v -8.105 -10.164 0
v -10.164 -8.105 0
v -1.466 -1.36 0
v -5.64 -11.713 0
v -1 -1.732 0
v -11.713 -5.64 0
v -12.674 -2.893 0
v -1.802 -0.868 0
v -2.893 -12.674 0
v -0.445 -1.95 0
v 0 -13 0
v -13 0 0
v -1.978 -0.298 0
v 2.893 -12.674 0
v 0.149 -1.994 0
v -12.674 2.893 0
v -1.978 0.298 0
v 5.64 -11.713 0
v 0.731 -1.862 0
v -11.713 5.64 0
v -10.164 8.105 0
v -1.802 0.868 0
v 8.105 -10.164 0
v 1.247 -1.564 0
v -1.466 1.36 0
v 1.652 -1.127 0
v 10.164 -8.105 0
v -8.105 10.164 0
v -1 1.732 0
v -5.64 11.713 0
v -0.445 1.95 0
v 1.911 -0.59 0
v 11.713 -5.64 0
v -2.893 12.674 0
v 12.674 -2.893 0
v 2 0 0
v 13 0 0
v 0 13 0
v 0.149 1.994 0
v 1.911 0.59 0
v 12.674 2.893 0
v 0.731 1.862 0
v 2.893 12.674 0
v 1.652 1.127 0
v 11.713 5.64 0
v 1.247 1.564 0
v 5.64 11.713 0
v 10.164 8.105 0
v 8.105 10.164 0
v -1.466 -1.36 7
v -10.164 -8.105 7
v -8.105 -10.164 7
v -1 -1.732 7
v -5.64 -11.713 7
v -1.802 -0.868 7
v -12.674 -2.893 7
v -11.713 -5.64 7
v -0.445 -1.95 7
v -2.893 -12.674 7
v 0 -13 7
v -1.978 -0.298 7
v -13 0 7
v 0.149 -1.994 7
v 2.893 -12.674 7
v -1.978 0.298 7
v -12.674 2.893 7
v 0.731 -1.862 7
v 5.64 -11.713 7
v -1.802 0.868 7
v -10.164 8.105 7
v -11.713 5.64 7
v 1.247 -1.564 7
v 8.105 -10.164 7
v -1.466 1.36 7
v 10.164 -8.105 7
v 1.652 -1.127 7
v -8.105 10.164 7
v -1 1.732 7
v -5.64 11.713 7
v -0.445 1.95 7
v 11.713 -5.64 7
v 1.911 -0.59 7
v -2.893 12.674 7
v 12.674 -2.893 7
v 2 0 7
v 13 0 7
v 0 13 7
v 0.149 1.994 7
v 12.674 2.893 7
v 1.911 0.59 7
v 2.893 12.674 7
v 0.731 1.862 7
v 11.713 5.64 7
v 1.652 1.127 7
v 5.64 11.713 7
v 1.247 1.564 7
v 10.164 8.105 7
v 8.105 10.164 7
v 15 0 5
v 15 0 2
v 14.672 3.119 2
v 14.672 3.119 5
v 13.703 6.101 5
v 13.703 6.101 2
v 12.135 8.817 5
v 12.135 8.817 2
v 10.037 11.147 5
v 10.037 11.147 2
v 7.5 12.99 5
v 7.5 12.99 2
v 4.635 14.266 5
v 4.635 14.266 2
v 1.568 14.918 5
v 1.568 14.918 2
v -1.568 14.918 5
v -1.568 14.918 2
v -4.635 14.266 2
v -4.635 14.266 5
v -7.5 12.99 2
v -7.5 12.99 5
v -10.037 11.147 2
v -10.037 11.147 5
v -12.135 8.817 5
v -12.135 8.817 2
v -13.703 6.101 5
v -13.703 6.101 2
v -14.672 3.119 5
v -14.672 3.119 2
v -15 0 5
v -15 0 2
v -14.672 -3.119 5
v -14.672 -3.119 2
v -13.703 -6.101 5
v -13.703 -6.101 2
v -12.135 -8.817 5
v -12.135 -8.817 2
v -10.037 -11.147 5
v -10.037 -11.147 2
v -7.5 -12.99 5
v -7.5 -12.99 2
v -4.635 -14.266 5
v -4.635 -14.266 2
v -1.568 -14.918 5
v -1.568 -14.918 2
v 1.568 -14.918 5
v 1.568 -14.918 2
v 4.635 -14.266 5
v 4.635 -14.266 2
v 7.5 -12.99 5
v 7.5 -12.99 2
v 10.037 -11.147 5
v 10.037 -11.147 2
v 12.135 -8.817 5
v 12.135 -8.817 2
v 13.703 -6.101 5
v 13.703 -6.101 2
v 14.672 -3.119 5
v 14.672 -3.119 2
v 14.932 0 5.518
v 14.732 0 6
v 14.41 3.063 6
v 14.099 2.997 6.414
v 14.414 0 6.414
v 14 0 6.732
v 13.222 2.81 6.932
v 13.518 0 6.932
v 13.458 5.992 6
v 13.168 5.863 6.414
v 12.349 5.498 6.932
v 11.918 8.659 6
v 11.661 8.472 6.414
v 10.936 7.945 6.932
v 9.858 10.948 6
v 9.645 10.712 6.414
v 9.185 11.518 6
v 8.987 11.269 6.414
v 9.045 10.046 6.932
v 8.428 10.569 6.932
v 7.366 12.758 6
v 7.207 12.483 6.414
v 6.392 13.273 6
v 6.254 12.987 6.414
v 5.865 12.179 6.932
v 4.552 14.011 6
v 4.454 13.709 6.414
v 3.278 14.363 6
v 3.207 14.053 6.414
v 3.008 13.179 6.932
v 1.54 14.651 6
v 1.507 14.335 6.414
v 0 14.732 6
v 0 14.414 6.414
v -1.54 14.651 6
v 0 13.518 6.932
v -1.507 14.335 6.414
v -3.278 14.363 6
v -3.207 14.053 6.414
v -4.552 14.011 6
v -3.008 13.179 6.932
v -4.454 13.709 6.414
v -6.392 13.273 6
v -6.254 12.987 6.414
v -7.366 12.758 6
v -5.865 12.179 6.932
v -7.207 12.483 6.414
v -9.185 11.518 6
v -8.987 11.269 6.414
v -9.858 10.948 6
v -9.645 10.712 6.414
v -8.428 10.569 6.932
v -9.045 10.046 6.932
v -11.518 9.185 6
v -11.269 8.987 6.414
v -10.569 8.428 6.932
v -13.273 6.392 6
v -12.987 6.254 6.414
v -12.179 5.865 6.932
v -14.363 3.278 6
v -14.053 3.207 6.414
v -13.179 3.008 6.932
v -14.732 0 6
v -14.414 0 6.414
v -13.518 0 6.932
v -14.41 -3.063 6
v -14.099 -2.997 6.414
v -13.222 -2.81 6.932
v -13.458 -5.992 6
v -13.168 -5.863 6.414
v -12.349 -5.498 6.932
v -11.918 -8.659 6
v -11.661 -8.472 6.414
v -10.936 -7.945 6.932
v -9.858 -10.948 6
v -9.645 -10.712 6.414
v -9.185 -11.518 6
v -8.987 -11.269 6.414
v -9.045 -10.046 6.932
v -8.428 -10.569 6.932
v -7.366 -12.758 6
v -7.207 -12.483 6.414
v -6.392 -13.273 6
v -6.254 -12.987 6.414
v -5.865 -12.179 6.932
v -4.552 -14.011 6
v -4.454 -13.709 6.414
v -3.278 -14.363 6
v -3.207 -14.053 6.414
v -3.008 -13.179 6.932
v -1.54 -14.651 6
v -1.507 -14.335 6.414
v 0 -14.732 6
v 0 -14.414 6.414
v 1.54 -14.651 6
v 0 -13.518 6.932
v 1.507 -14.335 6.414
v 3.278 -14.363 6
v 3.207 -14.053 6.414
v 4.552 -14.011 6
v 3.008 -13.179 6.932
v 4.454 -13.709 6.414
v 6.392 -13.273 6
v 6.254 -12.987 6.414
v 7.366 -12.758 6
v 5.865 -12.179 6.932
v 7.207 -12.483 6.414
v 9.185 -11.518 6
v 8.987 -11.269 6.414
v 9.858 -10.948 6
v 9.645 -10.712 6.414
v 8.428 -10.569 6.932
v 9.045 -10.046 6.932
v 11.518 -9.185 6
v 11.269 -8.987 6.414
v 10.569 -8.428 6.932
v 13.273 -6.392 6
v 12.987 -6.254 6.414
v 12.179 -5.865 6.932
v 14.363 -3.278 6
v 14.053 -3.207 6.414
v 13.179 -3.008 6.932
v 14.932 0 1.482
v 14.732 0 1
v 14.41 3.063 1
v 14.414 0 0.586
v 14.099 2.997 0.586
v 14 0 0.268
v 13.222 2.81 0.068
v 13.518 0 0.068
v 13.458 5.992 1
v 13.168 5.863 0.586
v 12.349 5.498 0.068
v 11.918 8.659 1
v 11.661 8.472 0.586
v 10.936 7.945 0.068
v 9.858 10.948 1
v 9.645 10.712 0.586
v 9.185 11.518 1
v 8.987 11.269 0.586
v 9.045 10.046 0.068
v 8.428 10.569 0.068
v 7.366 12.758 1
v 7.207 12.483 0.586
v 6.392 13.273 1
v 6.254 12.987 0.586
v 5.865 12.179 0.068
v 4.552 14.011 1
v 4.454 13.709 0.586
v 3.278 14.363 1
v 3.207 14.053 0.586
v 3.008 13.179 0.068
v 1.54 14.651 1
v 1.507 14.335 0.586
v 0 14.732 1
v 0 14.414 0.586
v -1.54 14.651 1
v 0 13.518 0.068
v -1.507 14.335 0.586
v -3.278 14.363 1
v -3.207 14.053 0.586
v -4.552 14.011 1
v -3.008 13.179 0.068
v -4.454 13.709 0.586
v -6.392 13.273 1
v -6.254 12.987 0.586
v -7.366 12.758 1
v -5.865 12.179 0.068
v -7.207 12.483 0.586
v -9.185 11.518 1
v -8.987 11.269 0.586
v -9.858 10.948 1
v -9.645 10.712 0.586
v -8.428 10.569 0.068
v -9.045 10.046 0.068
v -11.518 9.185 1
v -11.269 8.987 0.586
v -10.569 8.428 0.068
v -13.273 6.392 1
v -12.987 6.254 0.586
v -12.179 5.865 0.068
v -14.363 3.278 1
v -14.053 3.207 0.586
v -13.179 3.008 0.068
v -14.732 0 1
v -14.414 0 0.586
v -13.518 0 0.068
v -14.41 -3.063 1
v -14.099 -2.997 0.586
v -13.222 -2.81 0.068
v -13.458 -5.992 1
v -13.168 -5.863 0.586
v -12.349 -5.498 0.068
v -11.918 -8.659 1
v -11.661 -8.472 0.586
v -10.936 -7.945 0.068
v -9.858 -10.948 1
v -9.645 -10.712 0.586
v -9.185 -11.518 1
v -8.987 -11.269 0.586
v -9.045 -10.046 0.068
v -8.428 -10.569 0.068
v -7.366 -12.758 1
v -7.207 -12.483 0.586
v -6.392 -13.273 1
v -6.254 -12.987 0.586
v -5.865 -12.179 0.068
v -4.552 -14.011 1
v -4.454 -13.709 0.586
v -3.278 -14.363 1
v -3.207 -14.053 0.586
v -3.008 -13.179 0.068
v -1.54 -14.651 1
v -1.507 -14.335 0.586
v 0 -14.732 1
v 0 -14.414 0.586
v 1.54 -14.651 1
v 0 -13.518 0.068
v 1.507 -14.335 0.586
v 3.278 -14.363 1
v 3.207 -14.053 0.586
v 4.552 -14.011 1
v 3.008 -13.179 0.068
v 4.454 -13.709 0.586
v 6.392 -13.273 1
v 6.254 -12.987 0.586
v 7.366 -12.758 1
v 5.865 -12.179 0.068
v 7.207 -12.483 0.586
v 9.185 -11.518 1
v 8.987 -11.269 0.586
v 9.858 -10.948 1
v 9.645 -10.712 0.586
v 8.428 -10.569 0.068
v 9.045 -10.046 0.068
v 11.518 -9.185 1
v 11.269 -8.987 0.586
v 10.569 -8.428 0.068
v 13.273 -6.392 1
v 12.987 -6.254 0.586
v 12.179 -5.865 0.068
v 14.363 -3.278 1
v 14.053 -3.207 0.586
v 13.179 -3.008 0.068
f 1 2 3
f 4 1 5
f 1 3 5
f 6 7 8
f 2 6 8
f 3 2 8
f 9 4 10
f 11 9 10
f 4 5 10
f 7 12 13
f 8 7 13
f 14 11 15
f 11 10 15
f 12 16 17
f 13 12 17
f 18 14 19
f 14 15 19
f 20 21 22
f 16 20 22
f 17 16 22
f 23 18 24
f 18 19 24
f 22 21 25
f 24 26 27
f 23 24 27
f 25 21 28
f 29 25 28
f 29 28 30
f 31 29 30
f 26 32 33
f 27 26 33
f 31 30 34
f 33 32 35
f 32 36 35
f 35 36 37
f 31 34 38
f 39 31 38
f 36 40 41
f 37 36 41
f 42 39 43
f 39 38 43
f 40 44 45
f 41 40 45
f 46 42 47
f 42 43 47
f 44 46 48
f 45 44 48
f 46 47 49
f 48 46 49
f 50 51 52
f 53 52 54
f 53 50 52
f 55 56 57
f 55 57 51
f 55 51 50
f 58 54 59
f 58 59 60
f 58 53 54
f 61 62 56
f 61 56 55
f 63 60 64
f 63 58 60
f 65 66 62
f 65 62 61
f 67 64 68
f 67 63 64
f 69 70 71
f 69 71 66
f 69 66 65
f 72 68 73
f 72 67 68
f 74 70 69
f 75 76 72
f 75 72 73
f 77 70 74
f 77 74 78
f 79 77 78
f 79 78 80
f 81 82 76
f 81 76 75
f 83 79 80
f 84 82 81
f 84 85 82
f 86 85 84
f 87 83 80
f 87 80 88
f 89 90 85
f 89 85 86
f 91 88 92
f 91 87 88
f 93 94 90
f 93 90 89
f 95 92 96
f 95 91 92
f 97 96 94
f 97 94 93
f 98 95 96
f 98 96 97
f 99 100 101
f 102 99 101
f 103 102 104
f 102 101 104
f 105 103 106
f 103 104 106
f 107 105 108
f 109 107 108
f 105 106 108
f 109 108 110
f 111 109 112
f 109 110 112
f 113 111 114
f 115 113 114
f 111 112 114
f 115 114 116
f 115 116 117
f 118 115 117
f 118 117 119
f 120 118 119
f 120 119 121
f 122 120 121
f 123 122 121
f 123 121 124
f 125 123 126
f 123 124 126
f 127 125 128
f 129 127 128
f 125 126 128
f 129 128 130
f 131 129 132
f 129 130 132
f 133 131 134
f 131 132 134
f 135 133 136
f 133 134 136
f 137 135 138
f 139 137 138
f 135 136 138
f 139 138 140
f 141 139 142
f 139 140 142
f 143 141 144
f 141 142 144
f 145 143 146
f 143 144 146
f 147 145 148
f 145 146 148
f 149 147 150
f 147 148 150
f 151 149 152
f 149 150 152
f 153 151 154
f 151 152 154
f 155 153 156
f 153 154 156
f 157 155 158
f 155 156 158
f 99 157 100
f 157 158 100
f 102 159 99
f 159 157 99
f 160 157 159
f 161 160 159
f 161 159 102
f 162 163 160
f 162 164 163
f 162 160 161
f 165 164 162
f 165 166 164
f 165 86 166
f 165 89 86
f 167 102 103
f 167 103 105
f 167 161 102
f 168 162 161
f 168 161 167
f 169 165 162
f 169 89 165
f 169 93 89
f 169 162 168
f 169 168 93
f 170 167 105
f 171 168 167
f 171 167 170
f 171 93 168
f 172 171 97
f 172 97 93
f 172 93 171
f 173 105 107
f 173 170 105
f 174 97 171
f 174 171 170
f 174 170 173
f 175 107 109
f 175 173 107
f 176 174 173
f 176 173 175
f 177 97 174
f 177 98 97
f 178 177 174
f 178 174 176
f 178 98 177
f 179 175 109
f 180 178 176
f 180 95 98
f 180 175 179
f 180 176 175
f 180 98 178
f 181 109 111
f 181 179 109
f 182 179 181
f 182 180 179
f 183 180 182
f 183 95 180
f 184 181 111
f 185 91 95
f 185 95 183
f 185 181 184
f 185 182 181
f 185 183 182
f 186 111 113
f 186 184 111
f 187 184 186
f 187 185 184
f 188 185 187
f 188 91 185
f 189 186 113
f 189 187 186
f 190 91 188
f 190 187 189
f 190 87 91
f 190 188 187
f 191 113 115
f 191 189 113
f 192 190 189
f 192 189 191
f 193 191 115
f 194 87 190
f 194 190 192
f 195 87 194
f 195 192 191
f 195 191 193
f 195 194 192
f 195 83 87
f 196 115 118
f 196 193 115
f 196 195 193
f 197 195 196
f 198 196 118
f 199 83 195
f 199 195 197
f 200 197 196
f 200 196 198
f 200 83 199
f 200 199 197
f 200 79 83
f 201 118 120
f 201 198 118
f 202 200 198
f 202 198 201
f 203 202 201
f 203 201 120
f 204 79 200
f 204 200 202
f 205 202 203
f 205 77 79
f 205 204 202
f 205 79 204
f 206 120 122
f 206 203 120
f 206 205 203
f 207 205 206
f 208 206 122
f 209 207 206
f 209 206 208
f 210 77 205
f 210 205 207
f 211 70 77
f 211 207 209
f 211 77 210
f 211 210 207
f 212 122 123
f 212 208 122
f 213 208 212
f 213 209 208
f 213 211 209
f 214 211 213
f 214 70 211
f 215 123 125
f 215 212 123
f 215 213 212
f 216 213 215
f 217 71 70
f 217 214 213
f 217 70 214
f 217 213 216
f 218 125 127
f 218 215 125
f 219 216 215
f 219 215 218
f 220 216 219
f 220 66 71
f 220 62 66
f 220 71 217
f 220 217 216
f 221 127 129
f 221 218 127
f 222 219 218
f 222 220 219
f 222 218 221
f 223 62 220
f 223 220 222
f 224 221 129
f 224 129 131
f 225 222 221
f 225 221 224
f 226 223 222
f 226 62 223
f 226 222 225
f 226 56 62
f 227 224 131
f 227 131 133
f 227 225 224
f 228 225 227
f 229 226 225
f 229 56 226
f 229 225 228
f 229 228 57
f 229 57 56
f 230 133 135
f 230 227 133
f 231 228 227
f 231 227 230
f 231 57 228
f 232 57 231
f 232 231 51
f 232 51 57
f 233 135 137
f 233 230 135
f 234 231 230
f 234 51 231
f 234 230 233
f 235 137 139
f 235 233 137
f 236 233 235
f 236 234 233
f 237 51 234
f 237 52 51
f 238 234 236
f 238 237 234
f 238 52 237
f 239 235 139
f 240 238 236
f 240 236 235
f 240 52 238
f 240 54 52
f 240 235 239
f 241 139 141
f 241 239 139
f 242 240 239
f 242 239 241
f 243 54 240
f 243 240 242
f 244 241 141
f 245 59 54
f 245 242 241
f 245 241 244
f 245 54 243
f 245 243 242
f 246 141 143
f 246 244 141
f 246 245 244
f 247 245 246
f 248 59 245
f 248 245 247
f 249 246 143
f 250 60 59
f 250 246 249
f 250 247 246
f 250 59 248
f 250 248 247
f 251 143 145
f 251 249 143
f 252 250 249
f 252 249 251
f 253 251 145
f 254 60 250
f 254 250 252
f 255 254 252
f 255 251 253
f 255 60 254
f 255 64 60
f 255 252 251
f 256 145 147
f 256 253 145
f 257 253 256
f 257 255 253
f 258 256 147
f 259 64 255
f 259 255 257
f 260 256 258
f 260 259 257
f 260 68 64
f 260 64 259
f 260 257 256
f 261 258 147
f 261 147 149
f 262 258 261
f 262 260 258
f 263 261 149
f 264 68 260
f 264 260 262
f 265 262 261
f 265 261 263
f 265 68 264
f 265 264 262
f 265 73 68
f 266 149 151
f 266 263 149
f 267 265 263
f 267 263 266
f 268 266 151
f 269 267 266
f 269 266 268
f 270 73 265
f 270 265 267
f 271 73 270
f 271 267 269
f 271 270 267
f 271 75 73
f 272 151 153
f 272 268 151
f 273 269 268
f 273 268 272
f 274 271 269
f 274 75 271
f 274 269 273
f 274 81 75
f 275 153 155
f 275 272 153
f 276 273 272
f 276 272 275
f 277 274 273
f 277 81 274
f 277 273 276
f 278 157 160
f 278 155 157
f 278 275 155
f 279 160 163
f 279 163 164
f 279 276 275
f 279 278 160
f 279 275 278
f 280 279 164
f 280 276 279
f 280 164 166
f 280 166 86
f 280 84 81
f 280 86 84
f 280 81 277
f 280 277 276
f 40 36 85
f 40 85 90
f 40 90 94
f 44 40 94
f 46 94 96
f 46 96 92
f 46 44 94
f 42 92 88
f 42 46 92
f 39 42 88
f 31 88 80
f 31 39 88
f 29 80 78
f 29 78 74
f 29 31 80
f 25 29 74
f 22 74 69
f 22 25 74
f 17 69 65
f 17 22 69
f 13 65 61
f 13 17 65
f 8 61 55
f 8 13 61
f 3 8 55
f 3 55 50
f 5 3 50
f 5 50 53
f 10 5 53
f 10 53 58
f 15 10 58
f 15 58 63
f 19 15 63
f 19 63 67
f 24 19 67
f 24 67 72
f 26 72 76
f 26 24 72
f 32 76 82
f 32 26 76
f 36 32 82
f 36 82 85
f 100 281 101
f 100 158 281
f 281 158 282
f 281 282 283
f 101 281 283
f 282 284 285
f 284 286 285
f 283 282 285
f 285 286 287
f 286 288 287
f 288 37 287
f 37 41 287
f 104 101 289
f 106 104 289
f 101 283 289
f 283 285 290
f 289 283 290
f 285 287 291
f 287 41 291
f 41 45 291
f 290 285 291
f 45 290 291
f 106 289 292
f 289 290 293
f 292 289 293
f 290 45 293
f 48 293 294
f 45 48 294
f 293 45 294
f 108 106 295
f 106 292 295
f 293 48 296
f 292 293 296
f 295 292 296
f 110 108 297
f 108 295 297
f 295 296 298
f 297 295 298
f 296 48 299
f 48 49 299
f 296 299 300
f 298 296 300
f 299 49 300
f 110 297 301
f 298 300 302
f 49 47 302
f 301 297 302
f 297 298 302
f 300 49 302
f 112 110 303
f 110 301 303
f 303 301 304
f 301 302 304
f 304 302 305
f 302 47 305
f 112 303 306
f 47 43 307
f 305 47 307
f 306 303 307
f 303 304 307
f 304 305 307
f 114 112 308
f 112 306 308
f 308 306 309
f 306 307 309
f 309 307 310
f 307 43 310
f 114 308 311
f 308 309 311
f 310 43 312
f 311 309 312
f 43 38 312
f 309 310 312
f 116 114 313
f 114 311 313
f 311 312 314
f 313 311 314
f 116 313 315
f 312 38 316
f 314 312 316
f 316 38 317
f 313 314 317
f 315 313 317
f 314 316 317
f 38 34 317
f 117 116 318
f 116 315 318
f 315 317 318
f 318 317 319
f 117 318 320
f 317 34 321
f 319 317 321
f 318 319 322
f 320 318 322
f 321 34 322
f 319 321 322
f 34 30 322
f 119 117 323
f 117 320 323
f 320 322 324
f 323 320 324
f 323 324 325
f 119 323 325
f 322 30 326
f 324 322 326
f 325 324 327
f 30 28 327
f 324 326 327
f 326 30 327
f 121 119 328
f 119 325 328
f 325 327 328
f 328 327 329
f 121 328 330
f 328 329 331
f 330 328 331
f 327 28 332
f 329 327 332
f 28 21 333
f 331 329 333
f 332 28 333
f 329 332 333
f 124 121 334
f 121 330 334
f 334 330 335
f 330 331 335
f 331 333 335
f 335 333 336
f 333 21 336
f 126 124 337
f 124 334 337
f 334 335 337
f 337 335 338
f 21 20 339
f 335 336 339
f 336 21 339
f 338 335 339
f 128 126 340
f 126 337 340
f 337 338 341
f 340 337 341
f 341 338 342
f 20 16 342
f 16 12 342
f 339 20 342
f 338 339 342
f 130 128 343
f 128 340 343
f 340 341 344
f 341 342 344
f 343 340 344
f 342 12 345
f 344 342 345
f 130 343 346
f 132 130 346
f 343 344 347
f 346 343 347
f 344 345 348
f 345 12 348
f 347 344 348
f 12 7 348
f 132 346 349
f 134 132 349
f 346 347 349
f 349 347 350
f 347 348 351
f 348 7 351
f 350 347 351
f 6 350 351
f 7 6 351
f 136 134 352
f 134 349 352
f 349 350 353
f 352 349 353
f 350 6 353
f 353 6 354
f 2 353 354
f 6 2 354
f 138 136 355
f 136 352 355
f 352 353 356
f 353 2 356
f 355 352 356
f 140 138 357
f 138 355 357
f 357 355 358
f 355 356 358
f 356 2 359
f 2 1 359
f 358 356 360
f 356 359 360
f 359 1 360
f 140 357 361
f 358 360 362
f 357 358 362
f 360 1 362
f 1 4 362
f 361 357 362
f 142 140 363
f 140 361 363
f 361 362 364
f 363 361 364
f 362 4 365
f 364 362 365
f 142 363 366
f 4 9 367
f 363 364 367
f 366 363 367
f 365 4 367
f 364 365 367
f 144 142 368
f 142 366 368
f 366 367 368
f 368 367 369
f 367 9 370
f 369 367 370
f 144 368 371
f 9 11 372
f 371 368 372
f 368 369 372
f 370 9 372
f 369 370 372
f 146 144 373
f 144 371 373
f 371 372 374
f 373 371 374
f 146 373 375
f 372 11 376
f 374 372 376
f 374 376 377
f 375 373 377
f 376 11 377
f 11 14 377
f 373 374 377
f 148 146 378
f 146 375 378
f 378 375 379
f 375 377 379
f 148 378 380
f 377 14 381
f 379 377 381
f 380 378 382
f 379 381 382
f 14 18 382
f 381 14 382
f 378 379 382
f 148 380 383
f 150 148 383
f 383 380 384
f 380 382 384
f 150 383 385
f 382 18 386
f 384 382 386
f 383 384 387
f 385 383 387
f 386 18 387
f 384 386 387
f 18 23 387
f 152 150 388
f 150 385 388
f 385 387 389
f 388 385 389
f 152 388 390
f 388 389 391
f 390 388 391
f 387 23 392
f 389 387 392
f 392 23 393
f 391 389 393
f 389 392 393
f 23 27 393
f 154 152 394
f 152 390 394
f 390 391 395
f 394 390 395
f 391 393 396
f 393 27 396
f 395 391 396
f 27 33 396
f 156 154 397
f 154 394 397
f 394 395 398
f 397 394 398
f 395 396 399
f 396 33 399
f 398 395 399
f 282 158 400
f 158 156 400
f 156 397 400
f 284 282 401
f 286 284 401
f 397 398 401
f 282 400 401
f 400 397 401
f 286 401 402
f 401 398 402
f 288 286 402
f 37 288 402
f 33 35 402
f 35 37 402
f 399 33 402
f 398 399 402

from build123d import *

# Parameters (mm, degrees)
F0_R     = 15
F0_R_2   = 2
F1_DEPTH = 7
F2_R     = 2
F3_R     = 2


with BuildPart() as f1:
    # F0 (on Top) → F1 (new body)
    with BuildSketch(Plane.XY):
        Circle(F0_R)
        Circle(F0_R_2, mode=Mode.SUBTRACT)
    extrude(amount=F1_DEPTH)

    # F2
    f2_edges = [f1.edges().sort_by_distance(p)[0] for p in [
        (-15, 0, 7),
    ]]
    fillet(f2_edges, radius=F2_R)

    # F3
    f3_edges = [f1.edges().sort_by_distance(p)[0] for p in [
        (-15, 0, 0),
    ]]
    fillet(f3_edges, radius=F3_R)


solid = f1.part
